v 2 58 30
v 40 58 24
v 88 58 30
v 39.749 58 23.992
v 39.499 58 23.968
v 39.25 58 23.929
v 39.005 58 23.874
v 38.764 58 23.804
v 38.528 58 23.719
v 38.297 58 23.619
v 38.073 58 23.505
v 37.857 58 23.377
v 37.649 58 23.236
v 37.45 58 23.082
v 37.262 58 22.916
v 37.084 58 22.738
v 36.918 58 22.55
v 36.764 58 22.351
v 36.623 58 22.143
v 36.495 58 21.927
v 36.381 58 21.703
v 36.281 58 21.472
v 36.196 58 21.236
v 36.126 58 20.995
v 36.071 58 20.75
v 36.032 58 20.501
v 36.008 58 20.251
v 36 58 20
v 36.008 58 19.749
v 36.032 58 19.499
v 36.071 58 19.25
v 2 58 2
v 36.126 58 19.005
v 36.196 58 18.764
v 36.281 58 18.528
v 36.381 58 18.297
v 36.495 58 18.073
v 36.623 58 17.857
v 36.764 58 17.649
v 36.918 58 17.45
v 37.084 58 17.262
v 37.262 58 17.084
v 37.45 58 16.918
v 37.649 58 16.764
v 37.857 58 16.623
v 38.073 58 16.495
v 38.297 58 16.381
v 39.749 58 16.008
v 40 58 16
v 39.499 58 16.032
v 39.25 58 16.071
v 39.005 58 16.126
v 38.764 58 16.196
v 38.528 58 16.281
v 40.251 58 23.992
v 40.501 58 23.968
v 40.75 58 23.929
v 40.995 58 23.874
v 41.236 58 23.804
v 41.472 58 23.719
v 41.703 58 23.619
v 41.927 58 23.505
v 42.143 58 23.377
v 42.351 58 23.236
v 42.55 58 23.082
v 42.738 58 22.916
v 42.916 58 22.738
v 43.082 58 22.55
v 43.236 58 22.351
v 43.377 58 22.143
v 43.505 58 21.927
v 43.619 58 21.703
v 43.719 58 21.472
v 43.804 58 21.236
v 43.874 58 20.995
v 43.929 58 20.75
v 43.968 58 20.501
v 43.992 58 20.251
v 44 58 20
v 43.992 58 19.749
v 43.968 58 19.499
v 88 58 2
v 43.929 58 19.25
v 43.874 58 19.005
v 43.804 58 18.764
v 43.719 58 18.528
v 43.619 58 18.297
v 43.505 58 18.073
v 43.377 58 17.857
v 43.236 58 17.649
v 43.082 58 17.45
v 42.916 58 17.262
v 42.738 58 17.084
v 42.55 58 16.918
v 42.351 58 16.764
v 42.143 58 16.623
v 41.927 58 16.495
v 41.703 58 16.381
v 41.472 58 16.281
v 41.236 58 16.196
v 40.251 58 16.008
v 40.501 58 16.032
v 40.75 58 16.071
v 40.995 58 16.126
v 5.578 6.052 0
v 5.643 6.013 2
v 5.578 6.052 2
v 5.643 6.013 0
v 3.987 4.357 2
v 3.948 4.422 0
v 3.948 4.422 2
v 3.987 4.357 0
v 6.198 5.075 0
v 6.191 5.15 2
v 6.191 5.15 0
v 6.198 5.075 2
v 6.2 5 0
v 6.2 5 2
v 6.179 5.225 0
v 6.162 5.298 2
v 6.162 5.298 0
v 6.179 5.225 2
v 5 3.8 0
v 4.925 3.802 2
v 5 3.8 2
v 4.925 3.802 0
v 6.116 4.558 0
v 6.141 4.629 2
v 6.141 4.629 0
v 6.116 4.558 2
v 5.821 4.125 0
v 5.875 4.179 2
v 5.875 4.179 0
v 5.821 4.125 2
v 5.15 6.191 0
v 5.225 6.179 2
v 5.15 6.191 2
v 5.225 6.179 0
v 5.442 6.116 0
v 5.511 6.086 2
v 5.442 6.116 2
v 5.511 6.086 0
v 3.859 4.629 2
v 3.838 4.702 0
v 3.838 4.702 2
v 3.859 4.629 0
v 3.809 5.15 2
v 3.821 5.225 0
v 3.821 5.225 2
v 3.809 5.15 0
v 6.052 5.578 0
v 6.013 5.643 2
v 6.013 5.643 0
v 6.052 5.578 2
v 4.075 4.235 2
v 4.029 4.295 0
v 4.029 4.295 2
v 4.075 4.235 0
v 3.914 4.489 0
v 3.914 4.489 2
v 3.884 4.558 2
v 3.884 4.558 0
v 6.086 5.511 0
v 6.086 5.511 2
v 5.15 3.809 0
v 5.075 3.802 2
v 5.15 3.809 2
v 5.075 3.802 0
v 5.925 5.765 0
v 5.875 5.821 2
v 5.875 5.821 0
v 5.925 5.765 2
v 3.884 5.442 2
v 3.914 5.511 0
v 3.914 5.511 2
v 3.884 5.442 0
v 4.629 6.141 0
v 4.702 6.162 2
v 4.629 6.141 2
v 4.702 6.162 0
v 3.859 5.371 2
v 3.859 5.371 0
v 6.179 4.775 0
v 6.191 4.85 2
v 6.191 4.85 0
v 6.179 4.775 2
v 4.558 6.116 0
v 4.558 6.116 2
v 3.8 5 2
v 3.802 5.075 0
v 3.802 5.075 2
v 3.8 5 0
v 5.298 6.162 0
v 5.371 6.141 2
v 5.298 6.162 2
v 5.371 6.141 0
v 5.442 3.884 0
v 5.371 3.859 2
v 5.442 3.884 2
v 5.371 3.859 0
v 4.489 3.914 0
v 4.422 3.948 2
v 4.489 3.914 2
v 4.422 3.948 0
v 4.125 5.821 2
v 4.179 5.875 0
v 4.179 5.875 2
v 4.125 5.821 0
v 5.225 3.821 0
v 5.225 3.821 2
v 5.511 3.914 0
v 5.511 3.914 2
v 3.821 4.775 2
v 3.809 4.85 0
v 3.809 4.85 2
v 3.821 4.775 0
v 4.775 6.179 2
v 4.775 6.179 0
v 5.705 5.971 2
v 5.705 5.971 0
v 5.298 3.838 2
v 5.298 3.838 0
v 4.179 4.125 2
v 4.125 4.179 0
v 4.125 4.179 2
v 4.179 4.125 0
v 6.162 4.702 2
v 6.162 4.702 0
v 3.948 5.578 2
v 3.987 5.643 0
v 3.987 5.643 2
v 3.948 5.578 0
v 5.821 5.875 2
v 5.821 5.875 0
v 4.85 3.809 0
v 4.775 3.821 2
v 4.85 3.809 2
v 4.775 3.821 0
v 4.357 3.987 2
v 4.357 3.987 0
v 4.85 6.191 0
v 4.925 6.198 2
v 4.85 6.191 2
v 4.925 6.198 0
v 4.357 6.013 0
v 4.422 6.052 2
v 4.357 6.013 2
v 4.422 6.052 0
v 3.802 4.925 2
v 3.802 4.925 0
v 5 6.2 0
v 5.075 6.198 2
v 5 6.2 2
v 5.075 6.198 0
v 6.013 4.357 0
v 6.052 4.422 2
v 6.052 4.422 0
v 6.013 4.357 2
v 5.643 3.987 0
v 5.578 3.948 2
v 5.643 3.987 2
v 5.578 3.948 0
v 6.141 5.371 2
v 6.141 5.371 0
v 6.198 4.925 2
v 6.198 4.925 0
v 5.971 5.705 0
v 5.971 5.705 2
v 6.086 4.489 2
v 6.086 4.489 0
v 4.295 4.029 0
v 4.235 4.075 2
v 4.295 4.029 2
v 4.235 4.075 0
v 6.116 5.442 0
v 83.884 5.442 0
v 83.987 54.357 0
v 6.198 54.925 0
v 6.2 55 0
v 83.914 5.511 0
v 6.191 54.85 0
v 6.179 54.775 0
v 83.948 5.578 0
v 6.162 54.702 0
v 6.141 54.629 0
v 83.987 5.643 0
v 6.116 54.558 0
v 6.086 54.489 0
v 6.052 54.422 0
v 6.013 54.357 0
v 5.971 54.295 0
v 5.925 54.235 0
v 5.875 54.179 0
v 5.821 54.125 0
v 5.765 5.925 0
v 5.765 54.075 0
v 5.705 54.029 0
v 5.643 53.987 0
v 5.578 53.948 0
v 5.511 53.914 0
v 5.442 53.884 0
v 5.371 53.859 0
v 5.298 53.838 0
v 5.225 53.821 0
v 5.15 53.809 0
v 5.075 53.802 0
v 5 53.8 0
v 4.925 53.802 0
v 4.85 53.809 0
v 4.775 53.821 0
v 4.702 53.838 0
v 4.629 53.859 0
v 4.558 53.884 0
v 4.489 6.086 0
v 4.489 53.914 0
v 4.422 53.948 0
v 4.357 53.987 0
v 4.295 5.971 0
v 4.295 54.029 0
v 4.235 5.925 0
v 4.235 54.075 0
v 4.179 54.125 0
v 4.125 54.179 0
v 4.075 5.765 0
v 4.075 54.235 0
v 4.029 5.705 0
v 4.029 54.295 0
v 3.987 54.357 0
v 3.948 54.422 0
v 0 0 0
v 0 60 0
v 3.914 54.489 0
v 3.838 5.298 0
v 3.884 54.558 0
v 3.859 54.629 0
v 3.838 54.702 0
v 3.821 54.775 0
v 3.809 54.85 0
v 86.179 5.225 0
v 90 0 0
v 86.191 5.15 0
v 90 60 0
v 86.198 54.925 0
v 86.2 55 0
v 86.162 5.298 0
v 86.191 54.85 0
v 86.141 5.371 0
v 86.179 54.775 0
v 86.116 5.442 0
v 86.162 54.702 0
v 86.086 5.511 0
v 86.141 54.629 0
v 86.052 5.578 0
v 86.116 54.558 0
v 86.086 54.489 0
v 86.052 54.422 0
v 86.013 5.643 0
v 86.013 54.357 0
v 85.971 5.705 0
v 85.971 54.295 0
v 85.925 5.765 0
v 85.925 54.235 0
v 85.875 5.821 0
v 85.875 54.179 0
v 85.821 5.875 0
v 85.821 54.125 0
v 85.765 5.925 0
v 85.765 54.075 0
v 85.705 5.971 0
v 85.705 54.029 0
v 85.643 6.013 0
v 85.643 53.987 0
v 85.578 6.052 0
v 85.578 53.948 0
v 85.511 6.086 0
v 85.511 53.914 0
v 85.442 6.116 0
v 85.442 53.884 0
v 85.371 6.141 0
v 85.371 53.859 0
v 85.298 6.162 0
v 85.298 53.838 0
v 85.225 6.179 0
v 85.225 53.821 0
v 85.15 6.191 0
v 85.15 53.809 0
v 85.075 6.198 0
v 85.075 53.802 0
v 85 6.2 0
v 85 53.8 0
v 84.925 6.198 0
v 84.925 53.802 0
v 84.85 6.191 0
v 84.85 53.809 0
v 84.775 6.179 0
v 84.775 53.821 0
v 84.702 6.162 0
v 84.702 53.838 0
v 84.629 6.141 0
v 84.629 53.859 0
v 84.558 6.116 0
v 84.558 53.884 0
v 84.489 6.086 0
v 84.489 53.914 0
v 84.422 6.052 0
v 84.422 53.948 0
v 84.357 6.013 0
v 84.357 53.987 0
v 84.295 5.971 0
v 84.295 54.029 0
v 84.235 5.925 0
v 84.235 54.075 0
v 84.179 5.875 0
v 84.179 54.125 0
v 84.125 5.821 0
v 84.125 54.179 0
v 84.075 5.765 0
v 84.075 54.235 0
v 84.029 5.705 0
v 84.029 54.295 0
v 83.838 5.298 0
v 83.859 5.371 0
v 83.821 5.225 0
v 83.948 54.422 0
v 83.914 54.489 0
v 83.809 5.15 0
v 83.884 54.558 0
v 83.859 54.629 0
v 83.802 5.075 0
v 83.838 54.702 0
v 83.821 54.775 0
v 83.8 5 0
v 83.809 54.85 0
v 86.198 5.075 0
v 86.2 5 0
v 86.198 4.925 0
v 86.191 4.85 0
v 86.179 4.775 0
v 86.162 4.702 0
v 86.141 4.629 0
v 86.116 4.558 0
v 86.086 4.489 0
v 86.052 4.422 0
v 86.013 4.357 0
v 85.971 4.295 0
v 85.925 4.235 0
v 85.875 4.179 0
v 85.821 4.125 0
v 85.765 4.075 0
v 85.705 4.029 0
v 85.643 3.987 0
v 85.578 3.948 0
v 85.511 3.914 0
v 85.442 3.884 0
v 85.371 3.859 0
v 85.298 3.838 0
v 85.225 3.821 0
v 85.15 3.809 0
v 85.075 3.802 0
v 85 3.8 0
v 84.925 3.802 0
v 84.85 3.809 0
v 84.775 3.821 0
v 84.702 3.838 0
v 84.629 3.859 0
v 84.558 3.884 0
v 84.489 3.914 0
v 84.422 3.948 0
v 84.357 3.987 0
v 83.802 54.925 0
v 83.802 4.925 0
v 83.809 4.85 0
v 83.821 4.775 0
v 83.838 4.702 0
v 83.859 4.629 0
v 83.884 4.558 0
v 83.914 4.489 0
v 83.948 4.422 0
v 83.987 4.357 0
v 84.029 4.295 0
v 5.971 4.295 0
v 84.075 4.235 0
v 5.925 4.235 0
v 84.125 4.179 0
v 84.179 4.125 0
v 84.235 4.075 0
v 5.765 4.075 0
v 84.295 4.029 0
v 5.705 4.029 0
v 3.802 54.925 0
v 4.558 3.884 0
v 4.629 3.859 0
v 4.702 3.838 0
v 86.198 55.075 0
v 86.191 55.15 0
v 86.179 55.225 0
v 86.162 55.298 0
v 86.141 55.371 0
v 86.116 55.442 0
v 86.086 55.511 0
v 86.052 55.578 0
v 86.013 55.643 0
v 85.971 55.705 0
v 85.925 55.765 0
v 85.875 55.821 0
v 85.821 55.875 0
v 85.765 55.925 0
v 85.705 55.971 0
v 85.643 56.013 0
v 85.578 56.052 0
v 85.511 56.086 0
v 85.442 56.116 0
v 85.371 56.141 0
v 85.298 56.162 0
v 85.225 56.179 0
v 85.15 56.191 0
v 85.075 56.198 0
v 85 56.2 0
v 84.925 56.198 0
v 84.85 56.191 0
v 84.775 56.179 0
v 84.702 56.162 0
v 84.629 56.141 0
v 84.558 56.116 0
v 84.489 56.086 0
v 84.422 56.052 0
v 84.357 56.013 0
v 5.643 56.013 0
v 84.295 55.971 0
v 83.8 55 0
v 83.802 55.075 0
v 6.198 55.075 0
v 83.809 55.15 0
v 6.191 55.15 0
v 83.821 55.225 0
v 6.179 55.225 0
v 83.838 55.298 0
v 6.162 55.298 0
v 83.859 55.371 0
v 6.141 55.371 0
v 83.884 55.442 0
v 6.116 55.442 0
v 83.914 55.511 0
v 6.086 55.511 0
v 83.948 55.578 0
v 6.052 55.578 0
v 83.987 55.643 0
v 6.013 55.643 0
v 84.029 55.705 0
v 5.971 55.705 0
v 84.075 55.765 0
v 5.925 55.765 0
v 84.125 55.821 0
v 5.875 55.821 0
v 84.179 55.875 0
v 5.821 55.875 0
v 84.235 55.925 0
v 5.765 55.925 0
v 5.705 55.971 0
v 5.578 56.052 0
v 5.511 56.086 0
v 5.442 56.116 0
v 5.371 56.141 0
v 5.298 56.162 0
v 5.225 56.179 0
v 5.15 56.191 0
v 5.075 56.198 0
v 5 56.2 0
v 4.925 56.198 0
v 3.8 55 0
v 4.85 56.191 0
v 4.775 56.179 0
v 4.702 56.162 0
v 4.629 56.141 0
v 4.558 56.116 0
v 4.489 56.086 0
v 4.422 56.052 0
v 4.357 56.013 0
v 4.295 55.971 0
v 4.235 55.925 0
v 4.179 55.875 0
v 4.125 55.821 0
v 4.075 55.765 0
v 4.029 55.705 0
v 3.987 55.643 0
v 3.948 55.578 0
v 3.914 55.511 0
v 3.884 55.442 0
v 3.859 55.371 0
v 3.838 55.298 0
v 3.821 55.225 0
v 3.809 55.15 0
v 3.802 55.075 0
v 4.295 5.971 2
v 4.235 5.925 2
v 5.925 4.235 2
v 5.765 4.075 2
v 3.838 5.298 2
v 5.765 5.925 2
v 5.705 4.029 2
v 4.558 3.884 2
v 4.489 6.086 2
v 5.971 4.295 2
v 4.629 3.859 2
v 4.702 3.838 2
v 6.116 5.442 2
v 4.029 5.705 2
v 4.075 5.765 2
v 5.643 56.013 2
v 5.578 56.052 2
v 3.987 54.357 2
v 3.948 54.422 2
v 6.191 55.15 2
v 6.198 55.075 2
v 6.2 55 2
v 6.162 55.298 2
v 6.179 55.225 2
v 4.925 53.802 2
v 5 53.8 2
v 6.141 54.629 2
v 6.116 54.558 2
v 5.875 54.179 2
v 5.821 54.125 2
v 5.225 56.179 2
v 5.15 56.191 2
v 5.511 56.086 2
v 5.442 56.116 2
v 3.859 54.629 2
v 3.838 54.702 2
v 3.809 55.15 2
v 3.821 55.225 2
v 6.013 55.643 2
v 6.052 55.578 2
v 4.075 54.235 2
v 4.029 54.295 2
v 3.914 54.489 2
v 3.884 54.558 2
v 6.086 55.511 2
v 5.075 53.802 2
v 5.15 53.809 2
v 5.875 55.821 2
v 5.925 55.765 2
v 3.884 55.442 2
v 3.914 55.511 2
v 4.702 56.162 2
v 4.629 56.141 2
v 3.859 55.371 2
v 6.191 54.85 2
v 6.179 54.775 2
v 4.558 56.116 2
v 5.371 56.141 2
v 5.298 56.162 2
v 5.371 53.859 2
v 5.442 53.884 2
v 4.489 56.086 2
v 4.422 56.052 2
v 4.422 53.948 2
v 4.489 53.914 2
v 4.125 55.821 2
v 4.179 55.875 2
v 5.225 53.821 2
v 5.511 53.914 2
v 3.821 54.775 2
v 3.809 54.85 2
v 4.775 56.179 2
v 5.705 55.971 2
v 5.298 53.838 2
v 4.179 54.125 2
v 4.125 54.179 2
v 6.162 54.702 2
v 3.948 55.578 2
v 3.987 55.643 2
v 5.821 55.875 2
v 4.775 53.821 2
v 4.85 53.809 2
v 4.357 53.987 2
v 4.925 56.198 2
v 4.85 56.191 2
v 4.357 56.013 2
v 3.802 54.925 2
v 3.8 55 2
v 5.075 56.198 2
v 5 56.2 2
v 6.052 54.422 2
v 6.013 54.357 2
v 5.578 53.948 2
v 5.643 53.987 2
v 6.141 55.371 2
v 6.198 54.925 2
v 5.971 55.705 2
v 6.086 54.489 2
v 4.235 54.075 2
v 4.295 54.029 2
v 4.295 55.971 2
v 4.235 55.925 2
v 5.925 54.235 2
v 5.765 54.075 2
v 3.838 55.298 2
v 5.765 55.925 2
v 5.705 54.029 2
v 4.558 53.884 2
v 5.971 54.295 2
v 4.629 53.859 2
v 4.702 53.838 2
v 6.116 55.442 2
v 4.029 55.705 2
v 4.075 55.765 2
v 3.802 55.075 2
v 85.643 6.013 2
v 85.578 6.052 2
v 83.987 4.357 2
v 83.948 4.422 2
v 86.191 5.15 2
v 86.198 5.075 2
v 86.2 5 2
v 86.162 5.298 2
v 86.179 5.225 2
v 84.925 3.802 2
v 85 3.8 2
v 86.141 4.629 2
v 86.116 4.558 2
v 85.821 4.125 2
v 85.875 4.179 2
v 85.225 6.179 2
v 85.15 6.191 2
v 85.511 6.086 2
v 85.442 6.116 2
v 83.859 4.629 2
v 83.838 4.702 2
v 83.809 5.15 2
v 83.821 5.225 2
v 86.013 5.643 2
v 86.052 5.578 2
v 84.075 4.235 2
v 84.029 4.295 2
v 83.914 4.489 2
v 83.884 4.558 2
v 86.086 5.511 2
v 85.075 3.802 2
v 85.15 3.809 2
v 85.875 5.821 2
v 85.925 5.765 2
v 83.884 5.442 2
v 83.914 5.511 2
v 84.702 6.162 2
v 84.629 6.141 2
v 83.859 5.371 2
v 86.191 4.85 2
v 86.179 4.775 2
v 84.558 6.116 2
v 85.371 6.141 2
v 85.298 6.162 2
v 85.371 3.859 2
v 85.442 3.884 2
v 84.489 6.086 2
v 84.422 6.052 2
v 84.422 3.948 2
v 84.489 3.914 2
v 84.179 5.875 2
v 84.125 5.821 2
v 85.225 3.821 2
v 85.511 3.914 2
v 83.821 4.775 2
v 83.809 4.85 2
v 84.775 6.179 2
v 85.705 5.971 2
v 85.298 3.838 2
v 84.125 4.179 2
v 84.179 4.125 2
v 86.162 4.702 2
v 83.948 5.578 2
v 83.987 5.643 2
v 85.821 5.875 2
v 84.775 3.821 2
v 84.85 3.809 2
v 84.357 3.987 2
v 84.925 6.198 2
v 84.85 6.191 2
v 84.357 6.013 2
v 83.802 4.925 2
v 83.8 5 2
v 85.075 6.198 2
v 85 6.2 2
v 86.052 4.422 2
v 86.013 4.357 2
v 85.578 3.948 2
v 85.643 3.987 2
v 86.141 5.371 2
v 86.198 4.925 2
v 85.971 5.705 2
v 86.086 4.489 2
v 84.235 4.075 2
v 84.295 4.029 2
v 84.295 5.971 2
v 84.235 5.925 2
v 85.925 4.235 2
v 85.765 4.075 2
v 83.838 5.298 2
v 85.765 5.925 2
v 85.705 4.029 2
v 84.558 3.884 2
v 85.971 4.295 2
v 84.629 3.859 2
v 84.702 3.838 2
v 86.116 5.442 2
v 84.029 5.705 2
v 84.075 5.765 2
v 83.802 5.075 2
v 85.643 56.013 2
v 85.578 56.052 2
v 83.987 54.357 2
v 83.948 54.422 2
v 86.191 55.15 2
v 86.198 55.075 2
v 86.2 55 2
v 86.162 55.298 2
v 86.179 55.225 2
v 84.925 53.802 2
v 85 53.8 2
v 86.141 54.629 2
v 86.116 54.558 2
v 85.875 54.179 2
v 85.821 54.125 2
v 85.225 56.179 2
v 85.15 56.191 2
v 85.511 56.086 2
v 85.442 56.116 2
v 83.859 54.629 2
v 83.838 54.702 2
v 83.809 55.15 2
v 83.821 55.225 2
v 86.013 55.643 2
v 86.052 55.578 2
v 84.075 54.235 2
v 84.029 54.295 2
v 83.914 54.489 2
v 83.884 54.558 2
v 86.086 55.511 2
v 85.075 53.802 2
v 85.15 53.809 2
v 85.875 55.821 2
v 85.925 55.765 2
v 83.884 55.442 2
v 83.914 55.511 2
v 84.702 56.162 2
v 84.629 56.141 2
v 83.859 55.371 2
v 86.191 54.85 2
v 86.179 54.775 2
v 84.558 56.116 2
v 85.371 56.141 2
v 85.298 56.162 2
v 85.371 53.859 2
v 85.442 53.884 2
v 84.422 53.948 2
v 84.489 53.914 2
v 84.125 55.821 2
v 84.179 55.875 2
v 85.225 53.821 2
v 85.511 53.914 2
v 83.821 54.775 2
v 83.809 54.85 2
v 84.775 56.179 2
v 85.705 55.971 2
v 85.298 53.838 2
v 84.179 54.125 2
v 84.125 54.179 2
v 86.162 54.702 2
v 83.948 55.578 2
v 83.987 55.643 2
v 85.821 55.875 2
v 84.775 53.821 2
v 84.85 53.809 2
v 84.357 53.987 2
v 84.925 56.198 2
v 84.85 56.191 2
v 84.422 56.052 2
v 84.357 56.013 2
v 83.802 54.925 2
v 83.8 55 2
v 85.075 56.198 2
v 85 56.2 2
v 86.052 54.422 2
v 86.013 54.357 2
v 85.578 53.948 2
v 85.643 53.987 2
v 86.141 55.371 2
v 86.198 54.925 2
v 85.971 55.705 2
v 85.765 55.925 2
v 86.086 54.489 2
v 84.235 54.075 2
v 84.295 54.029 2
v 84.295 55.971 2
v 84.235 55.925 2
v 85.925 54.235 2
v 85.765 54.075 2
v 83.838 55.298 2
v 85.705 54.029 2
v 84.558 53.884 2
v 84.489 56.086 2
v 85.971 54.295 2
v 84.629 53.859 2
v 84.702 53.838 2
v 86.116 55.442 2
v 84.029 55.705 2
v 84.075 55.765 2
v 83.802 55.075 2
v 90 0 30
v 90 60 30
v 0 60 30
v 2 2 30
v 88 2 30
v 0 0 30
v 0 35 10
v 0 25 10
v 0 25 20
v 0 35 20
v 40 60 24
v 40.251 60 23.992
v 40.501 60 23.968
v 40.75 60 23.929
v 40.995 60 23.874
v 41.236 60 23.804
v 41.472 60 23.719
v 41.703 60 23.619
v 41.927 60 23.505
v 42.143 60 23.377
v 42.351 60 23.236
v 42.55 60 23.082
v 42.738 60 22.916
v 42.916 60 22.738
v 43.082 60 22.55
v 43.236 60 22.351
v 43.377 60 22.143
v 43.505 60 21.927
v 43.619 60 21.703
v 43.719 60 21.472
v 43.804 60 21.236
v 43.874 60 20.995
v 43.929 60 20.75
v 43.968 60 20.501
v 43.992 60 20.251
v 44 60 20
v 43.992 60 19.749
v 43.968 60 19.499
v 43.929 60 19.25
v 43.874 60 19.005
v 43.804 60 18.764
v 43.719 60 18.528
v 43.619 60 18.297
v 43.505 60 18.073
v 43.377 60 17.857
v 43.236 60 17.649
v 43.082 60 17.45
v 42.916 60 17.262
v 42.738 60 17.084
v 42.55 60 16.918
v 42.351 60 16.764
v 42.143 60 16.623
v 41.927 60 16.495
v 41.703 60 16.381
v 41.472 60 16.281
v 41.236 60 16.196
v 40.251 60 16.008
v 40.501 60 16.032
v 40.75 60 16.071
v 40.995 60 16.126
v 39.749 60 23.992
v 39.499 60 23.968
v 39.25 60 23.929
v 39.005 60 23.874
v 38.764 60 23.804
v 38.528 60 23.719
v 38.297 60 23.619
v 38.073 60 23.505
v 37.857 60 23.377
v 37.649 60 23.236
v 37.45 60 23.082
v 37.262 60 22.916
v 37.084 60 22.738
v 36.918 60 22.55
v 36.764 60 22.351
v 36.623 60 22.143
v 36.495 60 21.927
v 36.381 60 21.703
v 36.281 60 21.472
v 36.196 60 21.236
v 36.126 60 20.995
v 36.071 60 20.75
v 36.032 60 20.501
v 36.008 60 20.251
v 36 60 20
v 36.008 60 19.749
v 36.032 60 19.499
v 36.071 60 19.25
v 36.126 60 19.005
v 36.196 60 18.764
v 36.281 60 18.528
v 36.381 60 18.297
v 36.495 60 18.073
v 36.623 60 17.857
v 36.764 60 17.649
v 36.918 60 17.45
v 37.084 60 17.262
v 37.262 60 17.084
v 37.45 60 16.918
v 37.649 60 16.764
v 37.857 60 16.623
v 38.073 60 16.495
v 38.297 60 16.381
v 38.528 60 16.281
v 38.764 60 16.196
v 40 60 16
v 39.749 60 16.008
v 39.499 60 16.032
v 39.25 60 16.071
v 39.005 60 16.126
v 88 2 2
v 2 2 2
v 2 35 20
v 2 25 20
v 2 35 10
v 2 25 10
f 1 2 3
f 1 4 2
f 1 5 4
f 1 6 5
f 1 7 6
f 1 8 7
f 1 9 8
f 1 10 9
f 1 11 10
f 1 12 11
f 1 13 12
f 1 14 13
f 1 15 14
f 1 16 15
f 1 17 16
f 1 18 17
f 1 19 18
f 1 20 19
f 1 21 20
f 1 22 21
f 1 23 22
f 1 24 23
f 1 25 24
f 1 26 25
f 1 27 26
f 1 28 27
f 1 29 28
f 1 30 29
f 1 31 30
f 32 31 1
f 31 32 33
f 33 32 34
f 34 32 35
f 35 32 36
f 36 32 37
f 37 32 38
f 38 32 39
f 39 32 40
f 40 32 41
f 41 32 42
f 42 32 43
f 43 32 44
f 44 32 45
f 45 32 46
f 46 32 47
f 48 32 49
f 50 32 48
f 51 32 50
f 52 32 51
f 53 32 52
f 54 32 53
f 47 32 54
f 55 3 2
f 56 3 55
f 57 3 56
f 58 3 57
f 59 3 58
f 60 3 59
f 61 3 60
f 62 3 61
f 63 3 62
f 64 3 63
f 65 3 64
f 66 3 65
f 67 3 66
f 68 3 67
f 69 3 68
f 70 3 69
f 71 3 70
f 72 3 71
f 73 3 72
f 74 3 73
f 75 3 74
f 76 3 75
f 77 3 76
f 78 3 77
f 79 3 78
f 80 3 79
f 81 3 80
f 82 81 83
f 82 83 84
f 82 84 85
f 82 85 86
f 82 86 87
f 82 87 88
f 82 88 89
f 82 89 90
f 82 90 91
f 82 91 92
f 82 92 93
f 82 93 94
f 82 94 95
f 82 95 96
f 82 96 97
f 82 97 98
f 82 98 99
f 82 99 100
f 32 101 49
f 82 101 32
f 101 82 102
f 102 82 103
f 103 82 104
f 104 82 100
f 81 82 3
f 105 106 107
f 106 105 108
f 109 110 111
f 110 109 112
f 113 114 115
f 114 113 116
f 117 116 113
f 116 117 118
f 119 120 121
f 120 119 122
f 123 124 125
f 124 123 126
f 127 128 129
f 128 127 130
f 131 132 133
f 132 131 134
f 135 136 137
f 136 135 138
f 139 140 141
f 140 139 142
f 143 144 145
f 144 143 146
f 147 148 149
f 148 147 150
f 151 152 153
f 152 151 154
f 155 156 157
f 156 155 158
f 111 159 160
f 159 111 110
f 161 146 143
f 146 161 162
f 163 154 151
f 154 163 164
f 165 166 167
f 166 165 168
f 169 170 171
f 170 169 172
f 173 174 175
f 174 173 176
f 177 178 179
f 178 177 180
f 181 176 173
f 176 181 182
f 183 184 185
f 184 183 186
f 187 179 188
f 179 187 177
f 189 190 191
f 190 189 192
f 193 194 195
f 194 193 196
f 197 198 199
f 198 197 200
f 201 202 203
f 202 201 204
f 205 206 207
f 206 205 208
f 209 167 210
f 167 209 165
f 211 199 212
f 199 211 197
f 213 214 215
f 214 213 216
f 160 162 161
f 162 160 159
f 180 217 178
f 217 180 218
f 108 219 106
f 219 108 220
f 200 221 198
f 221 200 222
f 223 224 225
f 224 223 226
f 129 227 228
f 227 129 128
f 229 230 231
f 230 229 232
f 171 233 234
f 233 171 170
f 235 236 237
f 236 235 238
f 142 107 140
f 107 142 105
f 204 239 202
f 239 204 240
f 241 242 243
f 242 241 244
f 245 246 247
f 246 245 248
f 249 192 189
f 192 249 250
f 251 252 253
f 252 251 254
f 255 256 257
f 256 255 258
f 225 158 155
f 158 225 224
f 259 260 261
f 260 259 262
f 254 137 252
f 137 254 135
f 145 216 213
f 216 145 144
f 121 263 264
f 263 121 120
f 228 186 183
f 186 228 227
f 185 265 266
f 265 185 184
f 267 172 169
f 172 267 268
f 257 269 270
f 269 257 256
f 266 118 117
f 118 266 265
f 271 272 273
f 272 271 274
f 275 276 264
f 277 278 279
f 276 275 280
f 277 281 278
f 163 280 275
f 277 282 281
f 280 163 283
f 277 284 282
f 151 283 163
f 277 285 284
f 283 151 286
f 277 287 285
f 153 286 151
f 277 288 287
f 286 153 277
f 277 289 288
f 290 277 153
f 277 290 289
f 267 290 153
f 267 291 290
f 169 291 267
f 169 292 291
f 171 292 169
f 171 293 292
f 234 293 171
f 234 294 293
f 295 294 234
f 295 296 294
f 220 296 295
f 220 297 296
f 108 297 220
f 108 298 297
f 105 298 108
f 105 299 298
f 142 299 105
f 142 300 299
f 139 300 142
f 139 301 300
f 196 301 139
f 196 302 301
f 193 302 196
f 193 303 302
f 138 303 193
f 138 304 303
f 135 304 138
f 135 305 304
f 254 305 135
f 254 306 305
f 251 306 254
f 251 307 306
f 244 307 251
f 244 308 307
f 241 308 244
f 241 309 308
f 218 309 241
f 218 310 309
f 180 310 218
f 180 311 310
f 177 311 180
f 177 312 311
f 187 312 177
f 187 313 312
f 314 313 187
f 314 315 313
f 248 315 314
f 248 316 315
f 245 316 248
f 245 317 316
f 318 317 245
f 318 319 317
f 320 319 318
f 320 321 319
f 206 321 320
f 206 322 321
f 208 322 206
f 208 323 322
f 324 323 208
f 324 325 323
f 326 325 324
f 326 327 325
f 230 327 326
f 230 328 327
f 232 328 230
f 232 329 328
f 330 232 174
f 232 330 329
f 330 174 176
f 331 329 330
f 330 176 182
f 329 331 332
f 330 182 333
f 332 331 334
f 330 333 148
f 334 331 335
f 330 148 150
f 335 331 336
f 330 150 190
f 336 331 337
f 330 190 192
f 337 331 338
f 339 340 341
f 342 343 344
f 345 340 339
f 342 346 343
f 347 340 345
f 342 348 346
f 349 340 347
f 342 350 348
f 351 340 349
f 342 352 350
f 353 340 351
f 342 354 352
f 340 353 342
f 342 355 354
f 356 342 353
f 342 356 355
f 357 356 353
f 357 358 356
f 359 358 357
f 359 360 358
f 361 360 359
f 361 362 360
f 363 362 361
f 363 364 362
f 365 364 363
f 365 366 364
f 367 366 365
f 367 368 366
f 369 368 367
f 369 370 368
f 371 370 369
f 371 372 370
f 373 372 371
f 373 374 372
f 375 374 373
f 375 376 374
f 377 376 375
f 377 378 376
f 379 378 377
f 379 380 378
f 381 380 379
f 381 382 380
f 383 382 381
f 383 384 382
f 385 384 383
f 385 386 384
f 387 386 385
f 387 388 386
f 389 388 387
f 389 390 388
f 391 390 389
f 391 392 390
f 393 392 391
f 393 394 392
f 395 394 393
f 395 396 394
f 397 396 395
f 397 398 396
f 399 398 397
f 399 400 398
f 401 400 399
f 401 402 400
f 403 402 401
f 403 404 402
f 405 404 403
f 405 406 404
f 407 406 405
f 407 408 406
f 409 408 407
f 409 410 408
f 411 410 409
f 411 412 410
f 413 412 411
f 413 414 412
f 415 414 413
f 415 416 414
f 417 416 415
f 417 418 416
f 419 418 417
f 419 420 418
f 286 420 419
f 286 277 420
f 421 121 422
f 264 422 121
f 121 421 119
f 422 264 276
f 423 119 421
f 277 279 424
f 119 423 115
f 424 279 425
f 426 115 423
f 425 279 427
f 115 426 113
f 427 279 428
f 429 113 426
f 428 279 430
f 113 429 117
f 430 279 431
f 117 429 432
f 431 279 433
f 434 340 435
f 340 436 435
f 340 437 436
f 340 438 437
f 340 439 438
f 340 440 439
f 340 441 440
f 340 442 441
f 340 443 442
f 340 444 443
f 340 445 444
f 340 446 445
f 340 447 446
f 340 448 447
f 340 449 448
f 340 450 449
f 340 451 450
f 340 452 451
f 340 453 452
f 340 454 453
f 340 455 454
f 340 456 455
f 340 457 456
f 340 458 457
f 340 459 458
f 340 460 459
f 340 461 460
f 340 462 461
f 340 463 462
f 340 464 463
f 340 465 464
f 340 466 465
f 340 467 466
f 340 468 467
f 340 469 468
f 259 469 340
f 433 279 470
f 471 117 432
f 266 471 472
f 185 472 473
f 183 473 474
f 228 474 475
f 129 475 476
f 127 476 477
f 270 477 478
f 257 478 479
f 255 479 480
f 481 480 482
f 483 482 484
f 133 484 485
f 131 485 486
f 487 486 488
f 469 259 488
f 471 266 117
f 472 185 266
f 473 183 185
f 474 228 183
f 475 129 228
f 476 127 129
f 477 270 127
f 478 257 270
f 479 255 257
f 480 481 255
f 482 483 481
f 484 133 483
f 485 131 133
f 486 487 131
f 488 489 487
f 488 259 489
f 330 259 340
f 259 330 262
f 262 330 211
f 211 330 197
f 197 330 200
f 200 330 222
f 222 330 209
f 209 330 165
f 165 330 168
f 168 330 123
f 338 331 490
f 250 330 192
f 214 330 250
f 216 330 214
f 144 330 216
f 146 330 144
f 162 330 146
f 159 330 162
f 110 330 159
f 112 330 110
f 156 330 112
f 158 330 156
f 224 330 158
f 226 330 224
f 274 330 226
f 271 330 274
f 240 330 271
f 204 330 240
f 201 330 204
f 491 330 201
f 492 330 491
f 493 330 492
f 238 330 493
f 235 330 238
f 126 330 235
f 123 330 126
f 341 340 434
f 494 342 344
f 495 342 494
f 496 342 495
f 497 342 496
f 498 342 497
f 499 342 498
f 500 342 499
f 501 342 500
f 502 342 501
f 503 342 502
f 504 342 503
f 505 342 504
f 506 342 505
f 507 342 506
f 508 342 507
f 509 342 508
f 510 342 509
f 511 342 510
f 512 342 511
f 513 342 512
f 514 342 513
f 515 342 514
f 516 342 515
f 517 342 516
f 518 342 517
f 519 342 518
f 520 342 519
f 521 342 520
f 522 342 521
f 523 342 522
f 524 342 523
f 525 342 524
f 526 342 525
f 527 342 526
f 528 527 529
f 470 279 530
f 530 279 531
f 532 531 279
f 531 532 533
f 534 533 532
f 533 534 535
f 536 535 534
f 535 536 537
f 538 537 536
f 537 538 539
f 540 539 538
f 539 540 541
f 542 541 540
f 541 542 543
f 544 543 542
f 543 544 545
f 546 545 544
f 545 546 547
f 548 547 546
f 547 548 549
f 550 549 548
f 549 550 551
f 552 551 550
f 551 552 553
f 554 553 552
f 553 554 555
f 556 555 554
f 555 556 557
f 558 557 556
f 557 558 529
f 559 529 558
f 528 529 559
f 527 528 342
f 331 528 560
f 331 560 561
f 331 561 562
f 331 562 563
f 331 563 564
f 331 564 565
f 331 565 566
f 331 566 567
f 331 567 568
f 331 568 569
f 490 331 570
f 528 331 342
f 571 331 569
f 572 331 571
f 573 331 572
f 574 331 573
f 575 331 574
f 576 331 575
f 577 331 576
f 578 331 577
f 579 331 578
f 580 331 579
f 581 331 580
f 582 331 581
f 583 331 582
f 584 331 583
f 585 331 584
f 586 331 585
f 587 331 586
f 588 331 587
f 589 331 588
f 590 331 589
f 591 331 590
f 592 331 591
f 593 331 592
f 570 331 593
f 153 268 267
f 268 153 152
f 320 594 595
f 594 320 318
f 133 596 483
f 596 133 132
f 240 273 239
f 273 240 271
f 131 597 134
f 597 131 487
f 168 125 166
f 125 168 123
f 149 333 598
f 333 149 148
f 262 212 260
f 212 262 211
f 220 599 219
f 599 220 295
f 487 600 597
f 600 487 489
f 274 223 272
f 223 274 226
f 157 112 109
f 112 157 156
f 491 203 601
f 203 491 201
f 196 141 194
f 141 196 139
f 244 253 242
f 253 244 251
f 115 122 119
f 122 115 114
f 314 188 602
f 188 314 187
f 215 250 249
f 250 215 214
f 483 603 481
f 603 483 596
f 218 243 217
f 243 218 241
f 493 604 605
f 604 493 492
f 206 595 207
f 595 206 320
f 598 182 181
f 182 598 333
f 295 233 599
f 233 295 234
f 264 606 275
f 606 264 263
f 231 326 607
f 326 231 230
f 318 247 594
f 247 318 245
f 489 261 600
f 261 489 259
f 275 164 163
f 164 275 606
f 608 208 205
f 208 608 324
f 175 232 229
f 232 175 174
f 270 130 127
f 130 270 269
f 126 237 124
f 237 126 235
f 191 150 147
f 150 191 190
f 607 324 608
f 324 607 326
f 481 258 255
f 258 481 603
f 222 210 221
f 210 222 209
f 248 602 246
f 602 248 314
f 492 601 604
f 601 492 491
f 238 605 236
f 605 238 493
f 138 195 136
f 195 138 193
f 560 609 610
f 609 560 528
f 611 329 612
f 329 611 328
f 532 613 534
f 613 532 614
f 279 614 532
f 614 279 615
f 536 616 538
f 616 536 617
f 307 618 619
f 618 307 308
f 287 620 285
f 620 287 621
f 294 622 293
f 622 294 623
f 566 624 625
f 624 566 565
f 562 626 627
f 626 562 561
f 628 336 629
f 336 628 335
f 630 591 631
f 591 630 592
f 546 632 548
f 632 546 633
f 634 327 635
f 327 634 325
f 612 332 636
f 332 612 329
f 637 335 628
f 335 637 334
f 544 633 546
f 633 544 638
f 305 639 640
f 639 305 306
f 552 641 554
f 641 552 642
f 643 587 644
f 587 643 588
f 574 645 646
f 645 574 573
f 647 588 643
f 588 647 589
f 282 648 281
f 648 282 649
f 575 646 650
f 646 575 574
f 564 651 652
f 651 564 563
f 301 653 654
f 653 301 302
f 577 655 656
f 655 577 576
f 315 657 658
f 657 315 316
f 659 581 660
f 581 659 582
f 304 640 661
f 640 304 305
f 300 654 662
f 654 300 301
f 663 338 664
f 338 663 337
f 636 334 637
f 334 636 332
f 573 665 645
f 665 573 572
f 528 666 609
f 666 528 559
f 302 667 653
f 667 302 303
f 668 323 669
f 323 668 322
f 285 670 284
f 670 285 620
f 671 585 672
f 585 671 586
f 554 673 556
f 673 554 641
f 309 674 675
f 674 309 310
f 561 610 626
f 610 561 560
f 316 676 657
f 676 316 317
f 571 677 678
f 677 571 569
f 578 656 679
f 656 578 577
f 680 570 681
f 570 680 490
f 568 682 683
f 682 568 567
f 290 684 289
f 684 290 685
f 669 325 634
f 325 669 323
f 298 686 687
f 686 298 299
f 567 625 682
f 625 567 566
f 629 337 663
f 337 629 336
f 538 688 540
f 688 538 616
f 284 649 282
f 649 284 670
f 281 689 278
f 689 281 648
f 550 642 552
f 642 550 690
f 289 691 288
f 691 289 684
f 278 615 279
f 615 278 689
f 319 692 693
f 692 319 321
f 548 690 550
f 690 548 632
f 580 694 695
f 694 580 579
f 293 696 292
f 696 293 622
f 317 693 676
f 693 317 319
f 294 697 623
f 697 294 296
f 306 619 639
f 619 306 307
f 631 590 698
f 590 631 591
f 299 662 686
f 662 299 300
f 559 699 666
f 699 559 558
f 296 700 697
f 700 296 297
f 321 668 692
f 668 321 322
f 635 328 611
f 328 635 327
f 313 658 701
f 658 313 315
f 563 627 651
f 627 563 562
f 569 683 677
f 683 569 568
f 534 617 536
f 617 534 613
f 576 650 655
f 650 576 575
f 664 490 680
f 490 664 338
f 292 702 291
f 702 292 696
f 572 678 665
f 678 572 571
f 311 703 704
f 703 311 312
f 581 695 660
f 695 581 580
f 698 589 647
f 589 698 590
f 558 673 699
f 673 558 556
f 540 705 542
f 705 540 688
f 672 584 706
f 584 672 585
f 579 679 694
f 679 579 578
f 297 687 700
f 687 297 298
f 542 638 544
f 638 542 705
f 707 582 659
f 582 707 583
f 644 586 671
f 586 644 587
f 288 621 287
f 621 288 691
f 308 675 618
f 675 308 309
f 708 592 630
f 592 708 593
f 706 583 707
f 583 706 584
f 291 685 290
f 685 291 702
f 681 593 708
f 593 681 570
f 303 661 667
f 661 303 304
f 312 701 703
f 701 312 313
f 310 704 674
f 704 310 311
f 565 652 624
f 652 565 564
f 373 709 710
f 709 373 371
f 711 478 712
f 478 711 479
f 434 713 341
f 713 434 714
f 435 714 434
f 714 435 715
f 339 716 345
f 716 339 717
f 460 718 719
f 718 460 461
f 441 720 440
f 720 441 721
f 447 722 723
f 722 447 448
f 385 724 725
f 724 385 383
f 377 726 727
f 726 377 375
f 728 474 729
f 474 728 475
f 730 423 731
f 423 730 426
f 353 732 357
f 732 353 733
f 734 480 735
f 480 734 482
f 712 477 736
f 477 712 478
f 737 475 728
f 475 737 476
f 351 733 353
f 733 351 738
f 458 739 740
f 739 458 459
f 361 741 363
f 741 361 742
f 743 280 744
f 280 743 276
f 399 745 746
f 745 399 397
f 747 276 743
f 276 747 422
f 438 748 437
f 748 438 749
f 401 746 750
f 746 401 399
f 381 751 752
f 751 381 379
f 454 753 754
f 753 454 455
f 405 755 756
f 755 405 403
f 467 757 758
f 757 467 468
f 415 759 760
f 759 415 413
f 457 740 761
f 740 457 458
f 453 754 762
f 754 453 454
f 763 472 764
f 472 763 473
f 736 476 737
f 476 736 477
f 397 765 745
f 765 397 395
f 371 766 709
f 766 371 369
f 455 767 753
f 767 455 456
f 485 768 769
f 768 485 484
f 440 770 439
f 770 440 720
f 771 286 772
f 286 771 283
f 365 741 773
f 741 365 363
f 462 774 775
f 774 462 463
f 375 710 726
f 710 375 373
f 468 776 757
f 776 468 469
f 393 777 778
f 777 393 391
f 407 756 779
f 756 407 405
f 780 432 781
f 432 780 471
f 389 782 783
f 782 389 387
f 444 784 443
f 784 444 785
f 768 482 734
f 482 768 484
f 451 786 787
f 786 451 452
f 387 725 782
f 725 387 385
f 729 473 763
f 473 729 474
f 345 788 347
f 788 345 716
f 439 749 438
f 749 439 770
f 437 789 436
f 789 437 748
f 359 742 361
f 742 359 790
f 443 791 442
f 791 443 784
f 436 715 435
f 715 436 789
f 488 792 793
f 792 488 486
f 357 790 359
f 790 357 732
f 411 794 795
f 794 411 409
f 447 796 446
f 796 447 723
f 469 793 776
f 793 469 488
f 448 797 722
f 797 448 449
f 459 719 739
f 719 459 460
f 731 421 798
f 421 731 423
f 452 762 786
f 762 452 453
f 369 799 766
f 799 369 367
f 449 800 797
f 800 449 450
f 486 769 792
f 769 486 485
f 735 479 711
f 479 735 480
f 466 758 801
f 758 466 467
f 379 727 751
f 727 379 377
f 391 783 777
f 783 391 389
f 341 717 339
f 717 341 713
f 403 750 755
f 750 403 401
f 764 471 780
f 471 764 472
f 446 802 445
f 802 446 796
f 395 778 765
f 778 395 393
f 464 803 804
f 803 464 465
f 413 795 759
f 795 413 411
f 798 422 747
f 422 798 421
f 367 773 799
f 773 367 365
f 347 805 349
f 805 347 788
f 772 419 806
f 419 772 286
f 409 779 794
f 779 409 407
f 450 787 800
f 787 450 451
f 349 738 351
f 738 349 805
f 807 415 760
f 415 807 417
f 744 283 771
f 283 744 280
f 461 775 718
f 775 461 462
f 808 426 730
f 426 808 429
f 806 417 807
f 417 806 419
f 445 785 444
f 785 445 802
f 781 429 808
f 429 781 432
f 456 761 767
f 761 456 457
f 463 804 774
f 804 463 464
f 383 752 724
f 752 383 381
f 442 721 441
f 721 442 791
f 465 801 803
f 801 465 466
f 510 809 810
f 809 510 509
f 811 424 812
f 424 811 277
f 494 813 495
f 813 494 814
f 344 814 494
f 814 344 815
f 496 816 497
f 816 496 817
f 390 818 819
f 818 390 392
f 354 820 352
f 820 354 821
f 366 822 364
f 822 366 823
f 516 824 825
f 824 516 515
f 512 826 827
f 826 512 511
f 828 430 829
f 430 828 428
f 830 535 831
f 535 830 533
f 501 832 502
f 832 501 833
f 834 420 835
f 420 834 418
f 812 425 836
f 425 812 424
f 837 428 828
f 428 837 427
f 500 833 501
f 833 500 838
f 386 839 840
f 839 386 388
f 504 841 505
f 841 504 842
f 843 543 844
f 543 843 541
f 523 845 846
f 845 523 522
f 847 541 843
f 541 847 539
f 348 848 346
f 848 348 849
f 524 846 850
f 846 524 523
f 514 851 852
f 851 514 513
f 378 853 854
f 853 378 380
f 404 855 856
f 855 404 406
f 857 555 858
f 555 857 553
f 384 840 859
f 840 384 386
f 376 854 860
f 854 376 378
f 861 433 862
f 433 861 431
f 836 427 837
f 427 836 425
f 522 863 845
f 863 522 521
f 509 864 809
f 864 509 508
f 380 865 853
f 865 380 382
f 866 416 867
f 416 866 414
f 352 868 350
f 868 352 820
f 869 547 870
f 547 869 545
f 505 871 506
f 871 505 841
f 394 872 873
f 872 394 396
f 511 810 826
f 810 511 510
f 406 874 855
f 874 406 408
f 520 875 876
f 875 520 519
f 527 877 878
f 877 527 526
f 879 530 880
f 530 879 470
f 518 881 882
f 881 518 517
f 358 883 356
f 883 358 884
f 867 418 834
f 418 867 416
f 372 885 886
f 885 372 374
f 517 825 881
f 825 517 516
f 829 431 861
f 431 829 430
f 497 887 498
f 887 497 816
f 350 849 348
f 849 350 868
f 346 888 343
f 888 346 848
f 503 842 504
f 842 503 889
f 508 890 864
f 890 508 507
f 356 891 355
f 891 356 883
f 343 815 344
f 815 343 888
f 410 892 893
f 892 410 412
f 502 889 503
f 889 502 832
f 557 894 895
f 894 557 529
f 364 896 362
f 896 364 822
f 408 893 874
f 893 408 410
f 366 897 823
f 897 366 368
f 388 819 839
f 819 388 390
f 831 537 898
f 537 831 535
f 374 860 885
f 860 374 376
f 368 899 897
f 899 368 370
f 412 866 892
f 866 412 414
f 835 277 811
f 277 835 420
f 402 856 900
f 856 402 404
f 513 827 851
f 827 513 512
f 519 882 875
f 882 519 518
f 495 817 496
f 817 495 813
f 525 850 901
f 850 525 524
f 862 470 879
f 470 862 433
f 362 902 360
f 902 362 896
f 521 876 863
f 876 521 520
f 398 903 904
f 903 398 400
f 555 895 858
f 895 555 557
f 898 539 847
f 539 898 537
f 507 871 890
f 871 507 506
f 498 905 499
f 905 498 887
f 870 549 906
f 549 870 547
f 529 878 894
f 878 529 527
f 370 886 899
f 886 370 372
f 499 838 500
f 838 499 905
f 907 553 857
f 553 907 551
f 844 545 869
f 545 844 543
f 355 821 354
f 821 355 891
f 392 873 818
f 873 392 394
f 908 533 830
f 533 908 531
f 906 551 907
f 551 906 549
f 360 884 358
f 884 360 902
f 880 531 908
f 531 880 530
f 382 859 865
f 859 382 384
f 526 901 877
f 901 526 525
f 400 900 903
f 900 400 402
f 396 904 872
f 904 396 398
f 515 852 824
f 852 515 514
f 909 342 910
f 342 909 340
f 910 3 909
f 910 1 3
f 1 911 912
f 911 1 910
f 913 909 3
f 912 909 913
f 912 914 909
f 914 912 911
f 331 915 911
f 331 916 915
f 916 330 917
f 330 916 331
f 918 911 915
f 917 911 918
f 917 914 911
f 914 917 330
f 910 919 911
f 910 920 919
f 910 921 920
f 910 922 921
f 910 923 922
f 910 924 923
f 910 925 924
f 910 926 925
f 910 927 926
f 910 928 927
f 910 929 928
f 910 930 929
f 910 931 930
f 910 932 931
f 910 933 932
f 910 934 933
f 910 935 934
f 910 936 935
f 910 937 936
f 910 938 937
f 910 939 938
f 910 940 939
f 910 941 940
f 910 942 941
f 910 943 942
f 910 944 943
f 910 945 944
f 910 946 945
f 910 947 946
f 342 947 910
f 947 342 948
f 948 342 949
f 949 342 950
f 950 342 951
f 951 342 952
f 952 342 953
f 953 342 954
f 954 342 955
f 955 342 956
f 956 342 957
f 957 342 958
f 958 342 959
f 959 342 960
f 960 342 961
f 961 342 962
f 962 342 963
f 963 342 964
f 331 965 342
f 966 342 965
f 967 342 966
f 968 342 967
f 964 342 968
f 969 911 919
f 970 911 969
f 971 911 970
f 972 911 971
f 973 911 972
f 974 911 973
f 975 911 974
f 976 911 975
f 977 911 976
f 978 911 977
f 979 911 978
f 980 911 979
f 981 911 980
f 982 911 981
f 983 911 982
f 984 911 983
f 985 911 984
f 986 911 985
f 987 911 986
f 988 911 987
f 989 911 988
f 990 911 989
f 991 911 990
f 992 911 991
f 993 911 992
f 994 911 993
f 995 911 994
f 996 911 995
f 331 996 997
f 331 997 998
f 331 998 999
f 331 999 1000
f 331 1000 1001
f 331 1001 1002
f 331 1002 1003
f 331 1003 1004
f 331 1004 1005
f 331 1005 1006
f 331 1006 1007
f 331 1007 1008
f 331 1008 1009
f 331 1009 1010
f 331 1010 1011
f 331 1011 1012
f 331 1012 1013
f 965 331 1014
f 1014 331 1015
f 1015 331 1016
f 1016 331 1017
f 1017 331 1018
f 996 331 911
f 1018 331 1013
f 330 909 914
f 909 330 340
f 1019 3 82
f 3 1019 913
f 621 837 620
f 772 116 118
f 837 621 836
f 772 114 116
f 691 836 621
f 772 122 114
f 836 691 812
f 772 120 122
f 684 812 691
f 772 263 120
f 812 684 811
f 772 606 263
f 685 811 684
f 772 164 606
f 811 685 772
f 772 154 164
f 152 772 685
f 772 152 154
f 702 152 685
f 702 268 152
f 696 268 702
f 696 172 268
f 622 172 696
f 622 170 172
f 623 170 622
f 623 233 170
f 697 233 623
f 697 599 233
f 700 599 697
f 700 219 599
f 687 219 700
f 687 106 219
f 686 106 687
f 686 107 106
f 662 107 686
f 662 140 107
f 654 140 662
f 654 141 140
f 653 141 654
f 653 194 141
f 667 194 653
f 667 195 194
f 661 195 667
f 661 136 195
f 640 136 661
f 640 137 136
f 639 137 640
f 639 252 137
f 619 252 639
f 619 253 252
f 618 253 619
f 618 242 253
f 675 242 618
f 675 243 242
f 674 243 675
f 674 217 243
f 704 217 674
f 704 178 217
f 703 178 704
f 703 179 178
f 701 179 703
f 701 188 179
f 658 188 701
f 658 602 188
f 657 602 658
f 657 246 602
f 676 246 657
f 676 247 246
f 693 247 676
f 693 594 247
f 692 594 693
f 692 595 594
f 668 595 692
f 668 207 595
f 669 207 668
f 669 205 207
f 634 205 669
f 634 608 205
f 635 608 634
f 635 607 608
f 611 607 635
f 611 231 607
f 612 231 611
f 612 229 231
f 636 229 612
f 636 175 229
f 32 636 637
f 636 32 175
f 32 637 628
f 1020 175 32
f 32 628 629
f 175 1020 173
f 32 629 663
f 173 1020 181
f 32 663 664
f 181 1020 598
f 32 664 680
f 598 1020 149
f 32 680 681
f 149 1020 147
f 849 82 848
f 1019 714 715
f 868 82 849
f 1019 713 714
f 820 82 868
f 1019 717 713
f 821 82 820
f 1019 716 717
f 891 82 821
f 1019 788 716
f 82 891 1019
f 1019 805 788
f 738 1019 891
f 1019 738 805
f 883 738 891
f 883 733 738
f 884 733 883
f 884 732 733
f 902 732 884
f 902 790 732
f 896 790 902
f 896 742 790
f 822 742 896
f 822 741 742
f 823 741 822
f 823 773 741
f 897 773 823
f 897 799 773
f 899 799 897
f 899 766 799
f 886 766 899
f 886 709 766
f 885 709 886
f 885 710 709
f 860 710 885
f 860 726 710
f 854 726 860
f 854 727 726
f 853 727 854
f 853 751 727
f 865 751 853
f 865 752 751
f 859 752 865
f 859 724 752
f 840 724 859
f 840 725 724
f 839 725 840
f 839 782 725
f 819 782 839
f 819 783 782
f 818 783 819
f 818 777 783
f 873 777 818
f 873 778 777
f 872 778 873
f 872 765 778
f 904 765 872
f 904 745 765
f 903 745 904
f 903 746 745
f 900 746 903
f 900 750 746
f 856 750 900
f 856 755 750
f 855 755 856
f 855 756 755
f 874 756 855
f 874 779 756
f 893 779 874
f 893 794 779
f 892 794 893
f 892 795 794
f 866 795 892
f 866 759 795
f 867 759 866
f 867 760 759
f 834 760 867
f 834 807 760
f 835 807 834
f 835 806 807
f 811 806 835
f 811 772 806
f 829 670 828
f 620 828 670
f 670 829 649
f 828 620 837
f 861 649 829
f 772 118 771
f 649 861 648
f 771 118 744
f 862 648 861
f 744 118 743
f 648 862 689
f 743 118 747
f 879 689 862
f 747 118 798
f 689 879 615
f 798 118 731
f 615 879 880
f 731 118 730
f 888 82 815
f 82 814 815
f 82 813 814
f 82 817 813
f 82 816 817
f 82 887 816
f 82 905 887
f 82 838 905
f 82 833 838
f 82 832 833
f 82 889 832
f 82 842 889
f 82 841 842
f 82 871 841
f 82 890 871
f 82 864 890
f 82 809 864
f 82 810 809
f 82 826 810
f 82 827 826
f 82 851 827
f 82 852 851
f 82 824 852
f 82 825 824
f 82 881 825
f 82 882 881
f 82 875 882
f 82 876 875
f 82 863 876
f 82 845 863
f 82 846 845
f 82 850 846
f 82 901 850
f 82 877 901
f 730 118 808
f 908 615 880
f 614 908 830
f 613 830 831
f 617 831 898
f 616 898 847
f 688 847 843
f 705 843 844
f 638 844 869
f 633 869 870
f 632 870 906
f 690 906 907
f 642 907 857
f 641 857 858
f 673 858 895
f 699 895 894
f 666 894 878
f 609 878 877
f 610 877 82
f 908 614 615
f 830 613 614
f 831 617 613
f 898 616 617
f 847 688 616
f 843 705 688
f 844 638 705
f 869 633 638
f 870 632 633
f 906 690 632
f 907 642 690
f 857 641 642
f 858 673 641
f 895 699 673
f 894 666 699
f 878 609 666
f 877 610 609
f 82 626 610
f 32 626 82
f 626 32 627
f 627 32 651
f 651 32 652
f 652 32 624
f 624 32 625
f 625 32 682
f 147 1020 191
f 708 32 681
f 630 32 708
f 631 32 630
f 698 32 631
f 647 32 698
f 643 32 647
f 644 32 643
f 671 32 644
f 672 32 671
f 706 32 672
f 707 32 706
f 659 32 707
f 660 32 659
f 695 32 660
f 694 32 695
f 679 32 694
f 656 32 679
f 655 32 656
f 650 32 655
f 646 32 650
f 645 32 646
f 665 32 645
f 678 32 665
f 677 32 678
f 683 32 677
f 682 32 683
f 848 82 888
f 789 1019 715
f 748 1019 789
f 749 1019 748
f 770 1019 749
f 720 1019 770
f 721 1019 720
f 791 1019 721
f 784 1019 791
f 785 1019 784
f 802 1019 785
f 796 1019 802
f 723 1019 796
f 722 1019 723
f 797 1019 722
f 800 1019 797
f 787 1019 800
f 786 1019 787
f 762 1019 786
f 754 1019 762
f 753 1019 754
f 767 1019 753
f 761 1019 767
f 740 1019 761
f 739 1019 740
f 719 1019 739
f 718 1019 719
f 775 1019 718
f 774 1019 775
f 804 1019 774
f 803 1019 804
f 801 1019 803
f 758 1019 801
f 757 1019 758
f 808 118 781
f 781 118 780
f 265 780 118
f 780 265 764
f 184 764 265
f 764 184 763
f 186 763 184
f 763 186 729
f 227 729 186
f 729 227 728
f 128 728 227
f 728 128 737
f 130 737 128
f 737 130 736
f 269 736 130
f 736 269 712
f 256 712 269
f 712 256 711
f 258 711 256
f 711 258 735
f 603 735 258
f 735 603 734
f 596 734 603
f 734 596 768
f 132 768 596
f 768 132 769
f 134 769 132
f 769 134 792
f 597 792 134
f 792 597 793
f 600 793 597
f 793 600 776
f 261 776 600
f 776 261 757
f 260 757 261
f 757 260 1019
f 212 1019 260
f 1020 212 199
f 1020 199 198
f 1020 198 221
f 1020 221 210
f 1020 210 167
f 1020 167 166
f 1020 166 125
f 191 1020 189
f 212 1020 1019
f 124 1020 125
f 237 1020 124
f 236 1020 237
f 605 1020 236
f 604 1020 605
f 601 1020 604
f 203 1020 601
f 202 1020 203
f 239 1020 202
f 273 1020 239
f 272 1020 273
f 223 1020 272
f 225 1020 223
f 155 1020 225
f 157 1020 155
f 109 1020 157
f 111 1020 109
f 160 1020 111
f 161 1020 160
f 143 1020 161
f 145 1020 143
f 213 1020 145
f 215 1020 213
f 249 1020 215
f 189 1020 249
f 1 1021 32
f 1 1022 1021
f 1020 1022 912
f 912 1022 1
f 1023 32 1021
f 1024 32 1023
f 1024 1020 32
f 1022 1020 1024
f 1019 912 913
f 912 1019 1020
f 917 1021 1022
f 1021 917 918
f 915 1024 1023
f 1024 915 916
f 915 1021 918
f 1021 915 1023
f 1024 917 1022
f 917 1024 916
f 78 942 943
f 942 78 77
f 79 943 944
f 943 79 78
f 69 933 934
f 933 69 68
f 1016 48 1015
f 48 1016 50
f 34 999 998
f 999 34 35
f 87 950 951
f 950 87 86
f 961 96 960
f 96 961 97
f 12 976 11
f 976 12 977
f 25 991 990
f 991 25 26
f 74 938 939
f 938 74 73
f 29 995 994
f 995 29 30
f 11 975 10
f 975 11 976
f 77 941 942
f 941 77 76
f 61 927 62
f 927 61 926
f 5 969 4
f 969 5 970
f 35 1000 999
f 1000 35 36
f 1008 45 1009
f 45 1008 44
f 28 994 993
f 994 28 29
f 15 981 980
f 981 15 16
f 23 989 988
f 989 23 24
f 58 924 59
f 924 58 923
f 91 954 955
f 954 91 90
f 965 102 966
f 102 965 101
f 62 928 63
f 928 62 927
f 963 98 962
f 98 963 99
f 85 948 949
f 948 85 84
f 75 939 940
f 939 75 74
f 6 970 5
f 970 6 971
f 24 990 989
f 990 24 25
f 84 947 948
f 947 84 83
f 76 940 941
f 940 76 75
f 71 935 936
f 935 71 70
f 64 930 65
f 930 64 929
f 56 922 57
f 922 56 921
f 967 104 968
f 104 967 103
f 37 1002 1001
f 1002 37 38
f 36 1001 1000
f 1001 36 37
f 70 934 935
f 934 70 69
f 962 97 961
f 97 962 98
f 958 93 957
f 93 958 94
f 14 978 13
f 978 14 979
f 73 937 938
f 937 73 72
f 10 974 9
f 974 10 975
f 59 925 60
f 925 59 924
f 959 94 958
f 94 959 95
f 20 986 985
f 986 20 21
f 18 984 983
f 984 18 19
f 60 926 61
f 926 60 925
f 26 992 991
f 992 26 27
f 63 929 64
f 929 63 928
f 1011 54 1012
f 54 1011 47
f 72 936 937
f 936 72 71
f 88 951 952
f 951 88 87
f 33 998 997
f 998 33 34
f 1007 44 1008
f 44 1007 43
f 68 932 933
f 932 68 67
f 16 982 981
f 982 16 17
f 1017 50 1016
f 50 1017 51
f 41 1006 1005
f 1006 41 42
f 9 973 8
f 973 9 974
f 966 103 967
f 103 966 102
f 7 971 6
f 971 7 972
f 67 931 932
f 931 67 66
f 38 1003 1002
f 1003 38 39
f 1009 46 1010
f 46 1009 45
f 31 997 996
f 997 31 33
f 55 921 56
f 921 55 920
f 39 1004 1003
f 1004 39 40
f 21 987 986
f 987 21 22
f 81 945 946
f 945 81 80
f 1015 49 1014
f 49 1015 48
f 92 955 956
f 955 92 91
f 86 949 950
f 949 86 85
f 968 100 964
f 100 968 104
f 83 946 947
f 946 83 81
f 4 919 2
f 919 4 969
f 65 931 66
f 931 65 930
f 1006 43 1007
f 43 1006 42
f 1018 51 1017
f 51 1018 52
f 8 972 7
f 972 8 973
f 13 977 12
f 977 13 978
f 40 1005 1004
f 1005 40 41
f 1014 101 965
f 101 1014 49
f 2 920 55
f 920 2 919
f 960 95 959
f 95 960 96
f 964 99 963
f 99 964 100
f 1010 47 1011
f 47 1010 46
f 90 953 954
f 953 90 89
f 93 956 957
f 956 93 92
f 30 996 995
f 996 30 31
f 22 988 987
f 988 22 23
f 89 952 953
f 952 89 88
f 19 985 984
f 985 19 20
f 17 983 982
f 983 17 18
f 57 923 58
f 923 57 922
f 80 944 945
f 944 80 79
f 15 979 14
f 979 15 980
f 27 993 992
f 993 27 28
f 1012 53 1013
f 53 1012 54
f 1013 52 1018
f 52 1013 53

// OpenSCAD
// ESP32 Jammer Verici Kutusu - Potansiyometre Deliği Eklendi

$fn=100;

module verici_case_pot() {
    wall = 2;
    length = 90;
    width = 60;
    height = 30;

    difference() {
        cube([length, width, height]);
        translate([wall, wall, wall])
            cube([length - 2*wall, width - 2*wall, height]);

        // USB-C açıklığı (yan panel)
        translate([0, width/2 - 5, 10])
            cube([wall+0.1, 10, 10]);

        // SMA anten açıklığı (üst)
        translate([length/2 - 5, width, height - 10])
            rotate([90,0,0])
            cylinder(r=4, h=wall+0.1);

        // Buton deliği (üst yüzey)
        translate([length/2, width/2, height])
            cylinder(r=3, h=wall+0.5);

        // DHT sensör havalandırması
        for (i = [0:2]) {
            translate([5 + i*5, width - wall, height - 5])
                rotate([90,0,0])
                cylinder(r=1, h=wall+0.2);
        }

        // Montaj delikleri
        for (x = [5, length-5], y = [5, width-5]) {
            translate([x, y, 0])
                cylinder(r=1.2, h=height + 1);
        }

        // Potansiyometre deliği (üst yüzey)
        translate([20, 20, height])
            cylinder(r=3.25, h=wall+0.5);
    }
}

verici_case_pot();
